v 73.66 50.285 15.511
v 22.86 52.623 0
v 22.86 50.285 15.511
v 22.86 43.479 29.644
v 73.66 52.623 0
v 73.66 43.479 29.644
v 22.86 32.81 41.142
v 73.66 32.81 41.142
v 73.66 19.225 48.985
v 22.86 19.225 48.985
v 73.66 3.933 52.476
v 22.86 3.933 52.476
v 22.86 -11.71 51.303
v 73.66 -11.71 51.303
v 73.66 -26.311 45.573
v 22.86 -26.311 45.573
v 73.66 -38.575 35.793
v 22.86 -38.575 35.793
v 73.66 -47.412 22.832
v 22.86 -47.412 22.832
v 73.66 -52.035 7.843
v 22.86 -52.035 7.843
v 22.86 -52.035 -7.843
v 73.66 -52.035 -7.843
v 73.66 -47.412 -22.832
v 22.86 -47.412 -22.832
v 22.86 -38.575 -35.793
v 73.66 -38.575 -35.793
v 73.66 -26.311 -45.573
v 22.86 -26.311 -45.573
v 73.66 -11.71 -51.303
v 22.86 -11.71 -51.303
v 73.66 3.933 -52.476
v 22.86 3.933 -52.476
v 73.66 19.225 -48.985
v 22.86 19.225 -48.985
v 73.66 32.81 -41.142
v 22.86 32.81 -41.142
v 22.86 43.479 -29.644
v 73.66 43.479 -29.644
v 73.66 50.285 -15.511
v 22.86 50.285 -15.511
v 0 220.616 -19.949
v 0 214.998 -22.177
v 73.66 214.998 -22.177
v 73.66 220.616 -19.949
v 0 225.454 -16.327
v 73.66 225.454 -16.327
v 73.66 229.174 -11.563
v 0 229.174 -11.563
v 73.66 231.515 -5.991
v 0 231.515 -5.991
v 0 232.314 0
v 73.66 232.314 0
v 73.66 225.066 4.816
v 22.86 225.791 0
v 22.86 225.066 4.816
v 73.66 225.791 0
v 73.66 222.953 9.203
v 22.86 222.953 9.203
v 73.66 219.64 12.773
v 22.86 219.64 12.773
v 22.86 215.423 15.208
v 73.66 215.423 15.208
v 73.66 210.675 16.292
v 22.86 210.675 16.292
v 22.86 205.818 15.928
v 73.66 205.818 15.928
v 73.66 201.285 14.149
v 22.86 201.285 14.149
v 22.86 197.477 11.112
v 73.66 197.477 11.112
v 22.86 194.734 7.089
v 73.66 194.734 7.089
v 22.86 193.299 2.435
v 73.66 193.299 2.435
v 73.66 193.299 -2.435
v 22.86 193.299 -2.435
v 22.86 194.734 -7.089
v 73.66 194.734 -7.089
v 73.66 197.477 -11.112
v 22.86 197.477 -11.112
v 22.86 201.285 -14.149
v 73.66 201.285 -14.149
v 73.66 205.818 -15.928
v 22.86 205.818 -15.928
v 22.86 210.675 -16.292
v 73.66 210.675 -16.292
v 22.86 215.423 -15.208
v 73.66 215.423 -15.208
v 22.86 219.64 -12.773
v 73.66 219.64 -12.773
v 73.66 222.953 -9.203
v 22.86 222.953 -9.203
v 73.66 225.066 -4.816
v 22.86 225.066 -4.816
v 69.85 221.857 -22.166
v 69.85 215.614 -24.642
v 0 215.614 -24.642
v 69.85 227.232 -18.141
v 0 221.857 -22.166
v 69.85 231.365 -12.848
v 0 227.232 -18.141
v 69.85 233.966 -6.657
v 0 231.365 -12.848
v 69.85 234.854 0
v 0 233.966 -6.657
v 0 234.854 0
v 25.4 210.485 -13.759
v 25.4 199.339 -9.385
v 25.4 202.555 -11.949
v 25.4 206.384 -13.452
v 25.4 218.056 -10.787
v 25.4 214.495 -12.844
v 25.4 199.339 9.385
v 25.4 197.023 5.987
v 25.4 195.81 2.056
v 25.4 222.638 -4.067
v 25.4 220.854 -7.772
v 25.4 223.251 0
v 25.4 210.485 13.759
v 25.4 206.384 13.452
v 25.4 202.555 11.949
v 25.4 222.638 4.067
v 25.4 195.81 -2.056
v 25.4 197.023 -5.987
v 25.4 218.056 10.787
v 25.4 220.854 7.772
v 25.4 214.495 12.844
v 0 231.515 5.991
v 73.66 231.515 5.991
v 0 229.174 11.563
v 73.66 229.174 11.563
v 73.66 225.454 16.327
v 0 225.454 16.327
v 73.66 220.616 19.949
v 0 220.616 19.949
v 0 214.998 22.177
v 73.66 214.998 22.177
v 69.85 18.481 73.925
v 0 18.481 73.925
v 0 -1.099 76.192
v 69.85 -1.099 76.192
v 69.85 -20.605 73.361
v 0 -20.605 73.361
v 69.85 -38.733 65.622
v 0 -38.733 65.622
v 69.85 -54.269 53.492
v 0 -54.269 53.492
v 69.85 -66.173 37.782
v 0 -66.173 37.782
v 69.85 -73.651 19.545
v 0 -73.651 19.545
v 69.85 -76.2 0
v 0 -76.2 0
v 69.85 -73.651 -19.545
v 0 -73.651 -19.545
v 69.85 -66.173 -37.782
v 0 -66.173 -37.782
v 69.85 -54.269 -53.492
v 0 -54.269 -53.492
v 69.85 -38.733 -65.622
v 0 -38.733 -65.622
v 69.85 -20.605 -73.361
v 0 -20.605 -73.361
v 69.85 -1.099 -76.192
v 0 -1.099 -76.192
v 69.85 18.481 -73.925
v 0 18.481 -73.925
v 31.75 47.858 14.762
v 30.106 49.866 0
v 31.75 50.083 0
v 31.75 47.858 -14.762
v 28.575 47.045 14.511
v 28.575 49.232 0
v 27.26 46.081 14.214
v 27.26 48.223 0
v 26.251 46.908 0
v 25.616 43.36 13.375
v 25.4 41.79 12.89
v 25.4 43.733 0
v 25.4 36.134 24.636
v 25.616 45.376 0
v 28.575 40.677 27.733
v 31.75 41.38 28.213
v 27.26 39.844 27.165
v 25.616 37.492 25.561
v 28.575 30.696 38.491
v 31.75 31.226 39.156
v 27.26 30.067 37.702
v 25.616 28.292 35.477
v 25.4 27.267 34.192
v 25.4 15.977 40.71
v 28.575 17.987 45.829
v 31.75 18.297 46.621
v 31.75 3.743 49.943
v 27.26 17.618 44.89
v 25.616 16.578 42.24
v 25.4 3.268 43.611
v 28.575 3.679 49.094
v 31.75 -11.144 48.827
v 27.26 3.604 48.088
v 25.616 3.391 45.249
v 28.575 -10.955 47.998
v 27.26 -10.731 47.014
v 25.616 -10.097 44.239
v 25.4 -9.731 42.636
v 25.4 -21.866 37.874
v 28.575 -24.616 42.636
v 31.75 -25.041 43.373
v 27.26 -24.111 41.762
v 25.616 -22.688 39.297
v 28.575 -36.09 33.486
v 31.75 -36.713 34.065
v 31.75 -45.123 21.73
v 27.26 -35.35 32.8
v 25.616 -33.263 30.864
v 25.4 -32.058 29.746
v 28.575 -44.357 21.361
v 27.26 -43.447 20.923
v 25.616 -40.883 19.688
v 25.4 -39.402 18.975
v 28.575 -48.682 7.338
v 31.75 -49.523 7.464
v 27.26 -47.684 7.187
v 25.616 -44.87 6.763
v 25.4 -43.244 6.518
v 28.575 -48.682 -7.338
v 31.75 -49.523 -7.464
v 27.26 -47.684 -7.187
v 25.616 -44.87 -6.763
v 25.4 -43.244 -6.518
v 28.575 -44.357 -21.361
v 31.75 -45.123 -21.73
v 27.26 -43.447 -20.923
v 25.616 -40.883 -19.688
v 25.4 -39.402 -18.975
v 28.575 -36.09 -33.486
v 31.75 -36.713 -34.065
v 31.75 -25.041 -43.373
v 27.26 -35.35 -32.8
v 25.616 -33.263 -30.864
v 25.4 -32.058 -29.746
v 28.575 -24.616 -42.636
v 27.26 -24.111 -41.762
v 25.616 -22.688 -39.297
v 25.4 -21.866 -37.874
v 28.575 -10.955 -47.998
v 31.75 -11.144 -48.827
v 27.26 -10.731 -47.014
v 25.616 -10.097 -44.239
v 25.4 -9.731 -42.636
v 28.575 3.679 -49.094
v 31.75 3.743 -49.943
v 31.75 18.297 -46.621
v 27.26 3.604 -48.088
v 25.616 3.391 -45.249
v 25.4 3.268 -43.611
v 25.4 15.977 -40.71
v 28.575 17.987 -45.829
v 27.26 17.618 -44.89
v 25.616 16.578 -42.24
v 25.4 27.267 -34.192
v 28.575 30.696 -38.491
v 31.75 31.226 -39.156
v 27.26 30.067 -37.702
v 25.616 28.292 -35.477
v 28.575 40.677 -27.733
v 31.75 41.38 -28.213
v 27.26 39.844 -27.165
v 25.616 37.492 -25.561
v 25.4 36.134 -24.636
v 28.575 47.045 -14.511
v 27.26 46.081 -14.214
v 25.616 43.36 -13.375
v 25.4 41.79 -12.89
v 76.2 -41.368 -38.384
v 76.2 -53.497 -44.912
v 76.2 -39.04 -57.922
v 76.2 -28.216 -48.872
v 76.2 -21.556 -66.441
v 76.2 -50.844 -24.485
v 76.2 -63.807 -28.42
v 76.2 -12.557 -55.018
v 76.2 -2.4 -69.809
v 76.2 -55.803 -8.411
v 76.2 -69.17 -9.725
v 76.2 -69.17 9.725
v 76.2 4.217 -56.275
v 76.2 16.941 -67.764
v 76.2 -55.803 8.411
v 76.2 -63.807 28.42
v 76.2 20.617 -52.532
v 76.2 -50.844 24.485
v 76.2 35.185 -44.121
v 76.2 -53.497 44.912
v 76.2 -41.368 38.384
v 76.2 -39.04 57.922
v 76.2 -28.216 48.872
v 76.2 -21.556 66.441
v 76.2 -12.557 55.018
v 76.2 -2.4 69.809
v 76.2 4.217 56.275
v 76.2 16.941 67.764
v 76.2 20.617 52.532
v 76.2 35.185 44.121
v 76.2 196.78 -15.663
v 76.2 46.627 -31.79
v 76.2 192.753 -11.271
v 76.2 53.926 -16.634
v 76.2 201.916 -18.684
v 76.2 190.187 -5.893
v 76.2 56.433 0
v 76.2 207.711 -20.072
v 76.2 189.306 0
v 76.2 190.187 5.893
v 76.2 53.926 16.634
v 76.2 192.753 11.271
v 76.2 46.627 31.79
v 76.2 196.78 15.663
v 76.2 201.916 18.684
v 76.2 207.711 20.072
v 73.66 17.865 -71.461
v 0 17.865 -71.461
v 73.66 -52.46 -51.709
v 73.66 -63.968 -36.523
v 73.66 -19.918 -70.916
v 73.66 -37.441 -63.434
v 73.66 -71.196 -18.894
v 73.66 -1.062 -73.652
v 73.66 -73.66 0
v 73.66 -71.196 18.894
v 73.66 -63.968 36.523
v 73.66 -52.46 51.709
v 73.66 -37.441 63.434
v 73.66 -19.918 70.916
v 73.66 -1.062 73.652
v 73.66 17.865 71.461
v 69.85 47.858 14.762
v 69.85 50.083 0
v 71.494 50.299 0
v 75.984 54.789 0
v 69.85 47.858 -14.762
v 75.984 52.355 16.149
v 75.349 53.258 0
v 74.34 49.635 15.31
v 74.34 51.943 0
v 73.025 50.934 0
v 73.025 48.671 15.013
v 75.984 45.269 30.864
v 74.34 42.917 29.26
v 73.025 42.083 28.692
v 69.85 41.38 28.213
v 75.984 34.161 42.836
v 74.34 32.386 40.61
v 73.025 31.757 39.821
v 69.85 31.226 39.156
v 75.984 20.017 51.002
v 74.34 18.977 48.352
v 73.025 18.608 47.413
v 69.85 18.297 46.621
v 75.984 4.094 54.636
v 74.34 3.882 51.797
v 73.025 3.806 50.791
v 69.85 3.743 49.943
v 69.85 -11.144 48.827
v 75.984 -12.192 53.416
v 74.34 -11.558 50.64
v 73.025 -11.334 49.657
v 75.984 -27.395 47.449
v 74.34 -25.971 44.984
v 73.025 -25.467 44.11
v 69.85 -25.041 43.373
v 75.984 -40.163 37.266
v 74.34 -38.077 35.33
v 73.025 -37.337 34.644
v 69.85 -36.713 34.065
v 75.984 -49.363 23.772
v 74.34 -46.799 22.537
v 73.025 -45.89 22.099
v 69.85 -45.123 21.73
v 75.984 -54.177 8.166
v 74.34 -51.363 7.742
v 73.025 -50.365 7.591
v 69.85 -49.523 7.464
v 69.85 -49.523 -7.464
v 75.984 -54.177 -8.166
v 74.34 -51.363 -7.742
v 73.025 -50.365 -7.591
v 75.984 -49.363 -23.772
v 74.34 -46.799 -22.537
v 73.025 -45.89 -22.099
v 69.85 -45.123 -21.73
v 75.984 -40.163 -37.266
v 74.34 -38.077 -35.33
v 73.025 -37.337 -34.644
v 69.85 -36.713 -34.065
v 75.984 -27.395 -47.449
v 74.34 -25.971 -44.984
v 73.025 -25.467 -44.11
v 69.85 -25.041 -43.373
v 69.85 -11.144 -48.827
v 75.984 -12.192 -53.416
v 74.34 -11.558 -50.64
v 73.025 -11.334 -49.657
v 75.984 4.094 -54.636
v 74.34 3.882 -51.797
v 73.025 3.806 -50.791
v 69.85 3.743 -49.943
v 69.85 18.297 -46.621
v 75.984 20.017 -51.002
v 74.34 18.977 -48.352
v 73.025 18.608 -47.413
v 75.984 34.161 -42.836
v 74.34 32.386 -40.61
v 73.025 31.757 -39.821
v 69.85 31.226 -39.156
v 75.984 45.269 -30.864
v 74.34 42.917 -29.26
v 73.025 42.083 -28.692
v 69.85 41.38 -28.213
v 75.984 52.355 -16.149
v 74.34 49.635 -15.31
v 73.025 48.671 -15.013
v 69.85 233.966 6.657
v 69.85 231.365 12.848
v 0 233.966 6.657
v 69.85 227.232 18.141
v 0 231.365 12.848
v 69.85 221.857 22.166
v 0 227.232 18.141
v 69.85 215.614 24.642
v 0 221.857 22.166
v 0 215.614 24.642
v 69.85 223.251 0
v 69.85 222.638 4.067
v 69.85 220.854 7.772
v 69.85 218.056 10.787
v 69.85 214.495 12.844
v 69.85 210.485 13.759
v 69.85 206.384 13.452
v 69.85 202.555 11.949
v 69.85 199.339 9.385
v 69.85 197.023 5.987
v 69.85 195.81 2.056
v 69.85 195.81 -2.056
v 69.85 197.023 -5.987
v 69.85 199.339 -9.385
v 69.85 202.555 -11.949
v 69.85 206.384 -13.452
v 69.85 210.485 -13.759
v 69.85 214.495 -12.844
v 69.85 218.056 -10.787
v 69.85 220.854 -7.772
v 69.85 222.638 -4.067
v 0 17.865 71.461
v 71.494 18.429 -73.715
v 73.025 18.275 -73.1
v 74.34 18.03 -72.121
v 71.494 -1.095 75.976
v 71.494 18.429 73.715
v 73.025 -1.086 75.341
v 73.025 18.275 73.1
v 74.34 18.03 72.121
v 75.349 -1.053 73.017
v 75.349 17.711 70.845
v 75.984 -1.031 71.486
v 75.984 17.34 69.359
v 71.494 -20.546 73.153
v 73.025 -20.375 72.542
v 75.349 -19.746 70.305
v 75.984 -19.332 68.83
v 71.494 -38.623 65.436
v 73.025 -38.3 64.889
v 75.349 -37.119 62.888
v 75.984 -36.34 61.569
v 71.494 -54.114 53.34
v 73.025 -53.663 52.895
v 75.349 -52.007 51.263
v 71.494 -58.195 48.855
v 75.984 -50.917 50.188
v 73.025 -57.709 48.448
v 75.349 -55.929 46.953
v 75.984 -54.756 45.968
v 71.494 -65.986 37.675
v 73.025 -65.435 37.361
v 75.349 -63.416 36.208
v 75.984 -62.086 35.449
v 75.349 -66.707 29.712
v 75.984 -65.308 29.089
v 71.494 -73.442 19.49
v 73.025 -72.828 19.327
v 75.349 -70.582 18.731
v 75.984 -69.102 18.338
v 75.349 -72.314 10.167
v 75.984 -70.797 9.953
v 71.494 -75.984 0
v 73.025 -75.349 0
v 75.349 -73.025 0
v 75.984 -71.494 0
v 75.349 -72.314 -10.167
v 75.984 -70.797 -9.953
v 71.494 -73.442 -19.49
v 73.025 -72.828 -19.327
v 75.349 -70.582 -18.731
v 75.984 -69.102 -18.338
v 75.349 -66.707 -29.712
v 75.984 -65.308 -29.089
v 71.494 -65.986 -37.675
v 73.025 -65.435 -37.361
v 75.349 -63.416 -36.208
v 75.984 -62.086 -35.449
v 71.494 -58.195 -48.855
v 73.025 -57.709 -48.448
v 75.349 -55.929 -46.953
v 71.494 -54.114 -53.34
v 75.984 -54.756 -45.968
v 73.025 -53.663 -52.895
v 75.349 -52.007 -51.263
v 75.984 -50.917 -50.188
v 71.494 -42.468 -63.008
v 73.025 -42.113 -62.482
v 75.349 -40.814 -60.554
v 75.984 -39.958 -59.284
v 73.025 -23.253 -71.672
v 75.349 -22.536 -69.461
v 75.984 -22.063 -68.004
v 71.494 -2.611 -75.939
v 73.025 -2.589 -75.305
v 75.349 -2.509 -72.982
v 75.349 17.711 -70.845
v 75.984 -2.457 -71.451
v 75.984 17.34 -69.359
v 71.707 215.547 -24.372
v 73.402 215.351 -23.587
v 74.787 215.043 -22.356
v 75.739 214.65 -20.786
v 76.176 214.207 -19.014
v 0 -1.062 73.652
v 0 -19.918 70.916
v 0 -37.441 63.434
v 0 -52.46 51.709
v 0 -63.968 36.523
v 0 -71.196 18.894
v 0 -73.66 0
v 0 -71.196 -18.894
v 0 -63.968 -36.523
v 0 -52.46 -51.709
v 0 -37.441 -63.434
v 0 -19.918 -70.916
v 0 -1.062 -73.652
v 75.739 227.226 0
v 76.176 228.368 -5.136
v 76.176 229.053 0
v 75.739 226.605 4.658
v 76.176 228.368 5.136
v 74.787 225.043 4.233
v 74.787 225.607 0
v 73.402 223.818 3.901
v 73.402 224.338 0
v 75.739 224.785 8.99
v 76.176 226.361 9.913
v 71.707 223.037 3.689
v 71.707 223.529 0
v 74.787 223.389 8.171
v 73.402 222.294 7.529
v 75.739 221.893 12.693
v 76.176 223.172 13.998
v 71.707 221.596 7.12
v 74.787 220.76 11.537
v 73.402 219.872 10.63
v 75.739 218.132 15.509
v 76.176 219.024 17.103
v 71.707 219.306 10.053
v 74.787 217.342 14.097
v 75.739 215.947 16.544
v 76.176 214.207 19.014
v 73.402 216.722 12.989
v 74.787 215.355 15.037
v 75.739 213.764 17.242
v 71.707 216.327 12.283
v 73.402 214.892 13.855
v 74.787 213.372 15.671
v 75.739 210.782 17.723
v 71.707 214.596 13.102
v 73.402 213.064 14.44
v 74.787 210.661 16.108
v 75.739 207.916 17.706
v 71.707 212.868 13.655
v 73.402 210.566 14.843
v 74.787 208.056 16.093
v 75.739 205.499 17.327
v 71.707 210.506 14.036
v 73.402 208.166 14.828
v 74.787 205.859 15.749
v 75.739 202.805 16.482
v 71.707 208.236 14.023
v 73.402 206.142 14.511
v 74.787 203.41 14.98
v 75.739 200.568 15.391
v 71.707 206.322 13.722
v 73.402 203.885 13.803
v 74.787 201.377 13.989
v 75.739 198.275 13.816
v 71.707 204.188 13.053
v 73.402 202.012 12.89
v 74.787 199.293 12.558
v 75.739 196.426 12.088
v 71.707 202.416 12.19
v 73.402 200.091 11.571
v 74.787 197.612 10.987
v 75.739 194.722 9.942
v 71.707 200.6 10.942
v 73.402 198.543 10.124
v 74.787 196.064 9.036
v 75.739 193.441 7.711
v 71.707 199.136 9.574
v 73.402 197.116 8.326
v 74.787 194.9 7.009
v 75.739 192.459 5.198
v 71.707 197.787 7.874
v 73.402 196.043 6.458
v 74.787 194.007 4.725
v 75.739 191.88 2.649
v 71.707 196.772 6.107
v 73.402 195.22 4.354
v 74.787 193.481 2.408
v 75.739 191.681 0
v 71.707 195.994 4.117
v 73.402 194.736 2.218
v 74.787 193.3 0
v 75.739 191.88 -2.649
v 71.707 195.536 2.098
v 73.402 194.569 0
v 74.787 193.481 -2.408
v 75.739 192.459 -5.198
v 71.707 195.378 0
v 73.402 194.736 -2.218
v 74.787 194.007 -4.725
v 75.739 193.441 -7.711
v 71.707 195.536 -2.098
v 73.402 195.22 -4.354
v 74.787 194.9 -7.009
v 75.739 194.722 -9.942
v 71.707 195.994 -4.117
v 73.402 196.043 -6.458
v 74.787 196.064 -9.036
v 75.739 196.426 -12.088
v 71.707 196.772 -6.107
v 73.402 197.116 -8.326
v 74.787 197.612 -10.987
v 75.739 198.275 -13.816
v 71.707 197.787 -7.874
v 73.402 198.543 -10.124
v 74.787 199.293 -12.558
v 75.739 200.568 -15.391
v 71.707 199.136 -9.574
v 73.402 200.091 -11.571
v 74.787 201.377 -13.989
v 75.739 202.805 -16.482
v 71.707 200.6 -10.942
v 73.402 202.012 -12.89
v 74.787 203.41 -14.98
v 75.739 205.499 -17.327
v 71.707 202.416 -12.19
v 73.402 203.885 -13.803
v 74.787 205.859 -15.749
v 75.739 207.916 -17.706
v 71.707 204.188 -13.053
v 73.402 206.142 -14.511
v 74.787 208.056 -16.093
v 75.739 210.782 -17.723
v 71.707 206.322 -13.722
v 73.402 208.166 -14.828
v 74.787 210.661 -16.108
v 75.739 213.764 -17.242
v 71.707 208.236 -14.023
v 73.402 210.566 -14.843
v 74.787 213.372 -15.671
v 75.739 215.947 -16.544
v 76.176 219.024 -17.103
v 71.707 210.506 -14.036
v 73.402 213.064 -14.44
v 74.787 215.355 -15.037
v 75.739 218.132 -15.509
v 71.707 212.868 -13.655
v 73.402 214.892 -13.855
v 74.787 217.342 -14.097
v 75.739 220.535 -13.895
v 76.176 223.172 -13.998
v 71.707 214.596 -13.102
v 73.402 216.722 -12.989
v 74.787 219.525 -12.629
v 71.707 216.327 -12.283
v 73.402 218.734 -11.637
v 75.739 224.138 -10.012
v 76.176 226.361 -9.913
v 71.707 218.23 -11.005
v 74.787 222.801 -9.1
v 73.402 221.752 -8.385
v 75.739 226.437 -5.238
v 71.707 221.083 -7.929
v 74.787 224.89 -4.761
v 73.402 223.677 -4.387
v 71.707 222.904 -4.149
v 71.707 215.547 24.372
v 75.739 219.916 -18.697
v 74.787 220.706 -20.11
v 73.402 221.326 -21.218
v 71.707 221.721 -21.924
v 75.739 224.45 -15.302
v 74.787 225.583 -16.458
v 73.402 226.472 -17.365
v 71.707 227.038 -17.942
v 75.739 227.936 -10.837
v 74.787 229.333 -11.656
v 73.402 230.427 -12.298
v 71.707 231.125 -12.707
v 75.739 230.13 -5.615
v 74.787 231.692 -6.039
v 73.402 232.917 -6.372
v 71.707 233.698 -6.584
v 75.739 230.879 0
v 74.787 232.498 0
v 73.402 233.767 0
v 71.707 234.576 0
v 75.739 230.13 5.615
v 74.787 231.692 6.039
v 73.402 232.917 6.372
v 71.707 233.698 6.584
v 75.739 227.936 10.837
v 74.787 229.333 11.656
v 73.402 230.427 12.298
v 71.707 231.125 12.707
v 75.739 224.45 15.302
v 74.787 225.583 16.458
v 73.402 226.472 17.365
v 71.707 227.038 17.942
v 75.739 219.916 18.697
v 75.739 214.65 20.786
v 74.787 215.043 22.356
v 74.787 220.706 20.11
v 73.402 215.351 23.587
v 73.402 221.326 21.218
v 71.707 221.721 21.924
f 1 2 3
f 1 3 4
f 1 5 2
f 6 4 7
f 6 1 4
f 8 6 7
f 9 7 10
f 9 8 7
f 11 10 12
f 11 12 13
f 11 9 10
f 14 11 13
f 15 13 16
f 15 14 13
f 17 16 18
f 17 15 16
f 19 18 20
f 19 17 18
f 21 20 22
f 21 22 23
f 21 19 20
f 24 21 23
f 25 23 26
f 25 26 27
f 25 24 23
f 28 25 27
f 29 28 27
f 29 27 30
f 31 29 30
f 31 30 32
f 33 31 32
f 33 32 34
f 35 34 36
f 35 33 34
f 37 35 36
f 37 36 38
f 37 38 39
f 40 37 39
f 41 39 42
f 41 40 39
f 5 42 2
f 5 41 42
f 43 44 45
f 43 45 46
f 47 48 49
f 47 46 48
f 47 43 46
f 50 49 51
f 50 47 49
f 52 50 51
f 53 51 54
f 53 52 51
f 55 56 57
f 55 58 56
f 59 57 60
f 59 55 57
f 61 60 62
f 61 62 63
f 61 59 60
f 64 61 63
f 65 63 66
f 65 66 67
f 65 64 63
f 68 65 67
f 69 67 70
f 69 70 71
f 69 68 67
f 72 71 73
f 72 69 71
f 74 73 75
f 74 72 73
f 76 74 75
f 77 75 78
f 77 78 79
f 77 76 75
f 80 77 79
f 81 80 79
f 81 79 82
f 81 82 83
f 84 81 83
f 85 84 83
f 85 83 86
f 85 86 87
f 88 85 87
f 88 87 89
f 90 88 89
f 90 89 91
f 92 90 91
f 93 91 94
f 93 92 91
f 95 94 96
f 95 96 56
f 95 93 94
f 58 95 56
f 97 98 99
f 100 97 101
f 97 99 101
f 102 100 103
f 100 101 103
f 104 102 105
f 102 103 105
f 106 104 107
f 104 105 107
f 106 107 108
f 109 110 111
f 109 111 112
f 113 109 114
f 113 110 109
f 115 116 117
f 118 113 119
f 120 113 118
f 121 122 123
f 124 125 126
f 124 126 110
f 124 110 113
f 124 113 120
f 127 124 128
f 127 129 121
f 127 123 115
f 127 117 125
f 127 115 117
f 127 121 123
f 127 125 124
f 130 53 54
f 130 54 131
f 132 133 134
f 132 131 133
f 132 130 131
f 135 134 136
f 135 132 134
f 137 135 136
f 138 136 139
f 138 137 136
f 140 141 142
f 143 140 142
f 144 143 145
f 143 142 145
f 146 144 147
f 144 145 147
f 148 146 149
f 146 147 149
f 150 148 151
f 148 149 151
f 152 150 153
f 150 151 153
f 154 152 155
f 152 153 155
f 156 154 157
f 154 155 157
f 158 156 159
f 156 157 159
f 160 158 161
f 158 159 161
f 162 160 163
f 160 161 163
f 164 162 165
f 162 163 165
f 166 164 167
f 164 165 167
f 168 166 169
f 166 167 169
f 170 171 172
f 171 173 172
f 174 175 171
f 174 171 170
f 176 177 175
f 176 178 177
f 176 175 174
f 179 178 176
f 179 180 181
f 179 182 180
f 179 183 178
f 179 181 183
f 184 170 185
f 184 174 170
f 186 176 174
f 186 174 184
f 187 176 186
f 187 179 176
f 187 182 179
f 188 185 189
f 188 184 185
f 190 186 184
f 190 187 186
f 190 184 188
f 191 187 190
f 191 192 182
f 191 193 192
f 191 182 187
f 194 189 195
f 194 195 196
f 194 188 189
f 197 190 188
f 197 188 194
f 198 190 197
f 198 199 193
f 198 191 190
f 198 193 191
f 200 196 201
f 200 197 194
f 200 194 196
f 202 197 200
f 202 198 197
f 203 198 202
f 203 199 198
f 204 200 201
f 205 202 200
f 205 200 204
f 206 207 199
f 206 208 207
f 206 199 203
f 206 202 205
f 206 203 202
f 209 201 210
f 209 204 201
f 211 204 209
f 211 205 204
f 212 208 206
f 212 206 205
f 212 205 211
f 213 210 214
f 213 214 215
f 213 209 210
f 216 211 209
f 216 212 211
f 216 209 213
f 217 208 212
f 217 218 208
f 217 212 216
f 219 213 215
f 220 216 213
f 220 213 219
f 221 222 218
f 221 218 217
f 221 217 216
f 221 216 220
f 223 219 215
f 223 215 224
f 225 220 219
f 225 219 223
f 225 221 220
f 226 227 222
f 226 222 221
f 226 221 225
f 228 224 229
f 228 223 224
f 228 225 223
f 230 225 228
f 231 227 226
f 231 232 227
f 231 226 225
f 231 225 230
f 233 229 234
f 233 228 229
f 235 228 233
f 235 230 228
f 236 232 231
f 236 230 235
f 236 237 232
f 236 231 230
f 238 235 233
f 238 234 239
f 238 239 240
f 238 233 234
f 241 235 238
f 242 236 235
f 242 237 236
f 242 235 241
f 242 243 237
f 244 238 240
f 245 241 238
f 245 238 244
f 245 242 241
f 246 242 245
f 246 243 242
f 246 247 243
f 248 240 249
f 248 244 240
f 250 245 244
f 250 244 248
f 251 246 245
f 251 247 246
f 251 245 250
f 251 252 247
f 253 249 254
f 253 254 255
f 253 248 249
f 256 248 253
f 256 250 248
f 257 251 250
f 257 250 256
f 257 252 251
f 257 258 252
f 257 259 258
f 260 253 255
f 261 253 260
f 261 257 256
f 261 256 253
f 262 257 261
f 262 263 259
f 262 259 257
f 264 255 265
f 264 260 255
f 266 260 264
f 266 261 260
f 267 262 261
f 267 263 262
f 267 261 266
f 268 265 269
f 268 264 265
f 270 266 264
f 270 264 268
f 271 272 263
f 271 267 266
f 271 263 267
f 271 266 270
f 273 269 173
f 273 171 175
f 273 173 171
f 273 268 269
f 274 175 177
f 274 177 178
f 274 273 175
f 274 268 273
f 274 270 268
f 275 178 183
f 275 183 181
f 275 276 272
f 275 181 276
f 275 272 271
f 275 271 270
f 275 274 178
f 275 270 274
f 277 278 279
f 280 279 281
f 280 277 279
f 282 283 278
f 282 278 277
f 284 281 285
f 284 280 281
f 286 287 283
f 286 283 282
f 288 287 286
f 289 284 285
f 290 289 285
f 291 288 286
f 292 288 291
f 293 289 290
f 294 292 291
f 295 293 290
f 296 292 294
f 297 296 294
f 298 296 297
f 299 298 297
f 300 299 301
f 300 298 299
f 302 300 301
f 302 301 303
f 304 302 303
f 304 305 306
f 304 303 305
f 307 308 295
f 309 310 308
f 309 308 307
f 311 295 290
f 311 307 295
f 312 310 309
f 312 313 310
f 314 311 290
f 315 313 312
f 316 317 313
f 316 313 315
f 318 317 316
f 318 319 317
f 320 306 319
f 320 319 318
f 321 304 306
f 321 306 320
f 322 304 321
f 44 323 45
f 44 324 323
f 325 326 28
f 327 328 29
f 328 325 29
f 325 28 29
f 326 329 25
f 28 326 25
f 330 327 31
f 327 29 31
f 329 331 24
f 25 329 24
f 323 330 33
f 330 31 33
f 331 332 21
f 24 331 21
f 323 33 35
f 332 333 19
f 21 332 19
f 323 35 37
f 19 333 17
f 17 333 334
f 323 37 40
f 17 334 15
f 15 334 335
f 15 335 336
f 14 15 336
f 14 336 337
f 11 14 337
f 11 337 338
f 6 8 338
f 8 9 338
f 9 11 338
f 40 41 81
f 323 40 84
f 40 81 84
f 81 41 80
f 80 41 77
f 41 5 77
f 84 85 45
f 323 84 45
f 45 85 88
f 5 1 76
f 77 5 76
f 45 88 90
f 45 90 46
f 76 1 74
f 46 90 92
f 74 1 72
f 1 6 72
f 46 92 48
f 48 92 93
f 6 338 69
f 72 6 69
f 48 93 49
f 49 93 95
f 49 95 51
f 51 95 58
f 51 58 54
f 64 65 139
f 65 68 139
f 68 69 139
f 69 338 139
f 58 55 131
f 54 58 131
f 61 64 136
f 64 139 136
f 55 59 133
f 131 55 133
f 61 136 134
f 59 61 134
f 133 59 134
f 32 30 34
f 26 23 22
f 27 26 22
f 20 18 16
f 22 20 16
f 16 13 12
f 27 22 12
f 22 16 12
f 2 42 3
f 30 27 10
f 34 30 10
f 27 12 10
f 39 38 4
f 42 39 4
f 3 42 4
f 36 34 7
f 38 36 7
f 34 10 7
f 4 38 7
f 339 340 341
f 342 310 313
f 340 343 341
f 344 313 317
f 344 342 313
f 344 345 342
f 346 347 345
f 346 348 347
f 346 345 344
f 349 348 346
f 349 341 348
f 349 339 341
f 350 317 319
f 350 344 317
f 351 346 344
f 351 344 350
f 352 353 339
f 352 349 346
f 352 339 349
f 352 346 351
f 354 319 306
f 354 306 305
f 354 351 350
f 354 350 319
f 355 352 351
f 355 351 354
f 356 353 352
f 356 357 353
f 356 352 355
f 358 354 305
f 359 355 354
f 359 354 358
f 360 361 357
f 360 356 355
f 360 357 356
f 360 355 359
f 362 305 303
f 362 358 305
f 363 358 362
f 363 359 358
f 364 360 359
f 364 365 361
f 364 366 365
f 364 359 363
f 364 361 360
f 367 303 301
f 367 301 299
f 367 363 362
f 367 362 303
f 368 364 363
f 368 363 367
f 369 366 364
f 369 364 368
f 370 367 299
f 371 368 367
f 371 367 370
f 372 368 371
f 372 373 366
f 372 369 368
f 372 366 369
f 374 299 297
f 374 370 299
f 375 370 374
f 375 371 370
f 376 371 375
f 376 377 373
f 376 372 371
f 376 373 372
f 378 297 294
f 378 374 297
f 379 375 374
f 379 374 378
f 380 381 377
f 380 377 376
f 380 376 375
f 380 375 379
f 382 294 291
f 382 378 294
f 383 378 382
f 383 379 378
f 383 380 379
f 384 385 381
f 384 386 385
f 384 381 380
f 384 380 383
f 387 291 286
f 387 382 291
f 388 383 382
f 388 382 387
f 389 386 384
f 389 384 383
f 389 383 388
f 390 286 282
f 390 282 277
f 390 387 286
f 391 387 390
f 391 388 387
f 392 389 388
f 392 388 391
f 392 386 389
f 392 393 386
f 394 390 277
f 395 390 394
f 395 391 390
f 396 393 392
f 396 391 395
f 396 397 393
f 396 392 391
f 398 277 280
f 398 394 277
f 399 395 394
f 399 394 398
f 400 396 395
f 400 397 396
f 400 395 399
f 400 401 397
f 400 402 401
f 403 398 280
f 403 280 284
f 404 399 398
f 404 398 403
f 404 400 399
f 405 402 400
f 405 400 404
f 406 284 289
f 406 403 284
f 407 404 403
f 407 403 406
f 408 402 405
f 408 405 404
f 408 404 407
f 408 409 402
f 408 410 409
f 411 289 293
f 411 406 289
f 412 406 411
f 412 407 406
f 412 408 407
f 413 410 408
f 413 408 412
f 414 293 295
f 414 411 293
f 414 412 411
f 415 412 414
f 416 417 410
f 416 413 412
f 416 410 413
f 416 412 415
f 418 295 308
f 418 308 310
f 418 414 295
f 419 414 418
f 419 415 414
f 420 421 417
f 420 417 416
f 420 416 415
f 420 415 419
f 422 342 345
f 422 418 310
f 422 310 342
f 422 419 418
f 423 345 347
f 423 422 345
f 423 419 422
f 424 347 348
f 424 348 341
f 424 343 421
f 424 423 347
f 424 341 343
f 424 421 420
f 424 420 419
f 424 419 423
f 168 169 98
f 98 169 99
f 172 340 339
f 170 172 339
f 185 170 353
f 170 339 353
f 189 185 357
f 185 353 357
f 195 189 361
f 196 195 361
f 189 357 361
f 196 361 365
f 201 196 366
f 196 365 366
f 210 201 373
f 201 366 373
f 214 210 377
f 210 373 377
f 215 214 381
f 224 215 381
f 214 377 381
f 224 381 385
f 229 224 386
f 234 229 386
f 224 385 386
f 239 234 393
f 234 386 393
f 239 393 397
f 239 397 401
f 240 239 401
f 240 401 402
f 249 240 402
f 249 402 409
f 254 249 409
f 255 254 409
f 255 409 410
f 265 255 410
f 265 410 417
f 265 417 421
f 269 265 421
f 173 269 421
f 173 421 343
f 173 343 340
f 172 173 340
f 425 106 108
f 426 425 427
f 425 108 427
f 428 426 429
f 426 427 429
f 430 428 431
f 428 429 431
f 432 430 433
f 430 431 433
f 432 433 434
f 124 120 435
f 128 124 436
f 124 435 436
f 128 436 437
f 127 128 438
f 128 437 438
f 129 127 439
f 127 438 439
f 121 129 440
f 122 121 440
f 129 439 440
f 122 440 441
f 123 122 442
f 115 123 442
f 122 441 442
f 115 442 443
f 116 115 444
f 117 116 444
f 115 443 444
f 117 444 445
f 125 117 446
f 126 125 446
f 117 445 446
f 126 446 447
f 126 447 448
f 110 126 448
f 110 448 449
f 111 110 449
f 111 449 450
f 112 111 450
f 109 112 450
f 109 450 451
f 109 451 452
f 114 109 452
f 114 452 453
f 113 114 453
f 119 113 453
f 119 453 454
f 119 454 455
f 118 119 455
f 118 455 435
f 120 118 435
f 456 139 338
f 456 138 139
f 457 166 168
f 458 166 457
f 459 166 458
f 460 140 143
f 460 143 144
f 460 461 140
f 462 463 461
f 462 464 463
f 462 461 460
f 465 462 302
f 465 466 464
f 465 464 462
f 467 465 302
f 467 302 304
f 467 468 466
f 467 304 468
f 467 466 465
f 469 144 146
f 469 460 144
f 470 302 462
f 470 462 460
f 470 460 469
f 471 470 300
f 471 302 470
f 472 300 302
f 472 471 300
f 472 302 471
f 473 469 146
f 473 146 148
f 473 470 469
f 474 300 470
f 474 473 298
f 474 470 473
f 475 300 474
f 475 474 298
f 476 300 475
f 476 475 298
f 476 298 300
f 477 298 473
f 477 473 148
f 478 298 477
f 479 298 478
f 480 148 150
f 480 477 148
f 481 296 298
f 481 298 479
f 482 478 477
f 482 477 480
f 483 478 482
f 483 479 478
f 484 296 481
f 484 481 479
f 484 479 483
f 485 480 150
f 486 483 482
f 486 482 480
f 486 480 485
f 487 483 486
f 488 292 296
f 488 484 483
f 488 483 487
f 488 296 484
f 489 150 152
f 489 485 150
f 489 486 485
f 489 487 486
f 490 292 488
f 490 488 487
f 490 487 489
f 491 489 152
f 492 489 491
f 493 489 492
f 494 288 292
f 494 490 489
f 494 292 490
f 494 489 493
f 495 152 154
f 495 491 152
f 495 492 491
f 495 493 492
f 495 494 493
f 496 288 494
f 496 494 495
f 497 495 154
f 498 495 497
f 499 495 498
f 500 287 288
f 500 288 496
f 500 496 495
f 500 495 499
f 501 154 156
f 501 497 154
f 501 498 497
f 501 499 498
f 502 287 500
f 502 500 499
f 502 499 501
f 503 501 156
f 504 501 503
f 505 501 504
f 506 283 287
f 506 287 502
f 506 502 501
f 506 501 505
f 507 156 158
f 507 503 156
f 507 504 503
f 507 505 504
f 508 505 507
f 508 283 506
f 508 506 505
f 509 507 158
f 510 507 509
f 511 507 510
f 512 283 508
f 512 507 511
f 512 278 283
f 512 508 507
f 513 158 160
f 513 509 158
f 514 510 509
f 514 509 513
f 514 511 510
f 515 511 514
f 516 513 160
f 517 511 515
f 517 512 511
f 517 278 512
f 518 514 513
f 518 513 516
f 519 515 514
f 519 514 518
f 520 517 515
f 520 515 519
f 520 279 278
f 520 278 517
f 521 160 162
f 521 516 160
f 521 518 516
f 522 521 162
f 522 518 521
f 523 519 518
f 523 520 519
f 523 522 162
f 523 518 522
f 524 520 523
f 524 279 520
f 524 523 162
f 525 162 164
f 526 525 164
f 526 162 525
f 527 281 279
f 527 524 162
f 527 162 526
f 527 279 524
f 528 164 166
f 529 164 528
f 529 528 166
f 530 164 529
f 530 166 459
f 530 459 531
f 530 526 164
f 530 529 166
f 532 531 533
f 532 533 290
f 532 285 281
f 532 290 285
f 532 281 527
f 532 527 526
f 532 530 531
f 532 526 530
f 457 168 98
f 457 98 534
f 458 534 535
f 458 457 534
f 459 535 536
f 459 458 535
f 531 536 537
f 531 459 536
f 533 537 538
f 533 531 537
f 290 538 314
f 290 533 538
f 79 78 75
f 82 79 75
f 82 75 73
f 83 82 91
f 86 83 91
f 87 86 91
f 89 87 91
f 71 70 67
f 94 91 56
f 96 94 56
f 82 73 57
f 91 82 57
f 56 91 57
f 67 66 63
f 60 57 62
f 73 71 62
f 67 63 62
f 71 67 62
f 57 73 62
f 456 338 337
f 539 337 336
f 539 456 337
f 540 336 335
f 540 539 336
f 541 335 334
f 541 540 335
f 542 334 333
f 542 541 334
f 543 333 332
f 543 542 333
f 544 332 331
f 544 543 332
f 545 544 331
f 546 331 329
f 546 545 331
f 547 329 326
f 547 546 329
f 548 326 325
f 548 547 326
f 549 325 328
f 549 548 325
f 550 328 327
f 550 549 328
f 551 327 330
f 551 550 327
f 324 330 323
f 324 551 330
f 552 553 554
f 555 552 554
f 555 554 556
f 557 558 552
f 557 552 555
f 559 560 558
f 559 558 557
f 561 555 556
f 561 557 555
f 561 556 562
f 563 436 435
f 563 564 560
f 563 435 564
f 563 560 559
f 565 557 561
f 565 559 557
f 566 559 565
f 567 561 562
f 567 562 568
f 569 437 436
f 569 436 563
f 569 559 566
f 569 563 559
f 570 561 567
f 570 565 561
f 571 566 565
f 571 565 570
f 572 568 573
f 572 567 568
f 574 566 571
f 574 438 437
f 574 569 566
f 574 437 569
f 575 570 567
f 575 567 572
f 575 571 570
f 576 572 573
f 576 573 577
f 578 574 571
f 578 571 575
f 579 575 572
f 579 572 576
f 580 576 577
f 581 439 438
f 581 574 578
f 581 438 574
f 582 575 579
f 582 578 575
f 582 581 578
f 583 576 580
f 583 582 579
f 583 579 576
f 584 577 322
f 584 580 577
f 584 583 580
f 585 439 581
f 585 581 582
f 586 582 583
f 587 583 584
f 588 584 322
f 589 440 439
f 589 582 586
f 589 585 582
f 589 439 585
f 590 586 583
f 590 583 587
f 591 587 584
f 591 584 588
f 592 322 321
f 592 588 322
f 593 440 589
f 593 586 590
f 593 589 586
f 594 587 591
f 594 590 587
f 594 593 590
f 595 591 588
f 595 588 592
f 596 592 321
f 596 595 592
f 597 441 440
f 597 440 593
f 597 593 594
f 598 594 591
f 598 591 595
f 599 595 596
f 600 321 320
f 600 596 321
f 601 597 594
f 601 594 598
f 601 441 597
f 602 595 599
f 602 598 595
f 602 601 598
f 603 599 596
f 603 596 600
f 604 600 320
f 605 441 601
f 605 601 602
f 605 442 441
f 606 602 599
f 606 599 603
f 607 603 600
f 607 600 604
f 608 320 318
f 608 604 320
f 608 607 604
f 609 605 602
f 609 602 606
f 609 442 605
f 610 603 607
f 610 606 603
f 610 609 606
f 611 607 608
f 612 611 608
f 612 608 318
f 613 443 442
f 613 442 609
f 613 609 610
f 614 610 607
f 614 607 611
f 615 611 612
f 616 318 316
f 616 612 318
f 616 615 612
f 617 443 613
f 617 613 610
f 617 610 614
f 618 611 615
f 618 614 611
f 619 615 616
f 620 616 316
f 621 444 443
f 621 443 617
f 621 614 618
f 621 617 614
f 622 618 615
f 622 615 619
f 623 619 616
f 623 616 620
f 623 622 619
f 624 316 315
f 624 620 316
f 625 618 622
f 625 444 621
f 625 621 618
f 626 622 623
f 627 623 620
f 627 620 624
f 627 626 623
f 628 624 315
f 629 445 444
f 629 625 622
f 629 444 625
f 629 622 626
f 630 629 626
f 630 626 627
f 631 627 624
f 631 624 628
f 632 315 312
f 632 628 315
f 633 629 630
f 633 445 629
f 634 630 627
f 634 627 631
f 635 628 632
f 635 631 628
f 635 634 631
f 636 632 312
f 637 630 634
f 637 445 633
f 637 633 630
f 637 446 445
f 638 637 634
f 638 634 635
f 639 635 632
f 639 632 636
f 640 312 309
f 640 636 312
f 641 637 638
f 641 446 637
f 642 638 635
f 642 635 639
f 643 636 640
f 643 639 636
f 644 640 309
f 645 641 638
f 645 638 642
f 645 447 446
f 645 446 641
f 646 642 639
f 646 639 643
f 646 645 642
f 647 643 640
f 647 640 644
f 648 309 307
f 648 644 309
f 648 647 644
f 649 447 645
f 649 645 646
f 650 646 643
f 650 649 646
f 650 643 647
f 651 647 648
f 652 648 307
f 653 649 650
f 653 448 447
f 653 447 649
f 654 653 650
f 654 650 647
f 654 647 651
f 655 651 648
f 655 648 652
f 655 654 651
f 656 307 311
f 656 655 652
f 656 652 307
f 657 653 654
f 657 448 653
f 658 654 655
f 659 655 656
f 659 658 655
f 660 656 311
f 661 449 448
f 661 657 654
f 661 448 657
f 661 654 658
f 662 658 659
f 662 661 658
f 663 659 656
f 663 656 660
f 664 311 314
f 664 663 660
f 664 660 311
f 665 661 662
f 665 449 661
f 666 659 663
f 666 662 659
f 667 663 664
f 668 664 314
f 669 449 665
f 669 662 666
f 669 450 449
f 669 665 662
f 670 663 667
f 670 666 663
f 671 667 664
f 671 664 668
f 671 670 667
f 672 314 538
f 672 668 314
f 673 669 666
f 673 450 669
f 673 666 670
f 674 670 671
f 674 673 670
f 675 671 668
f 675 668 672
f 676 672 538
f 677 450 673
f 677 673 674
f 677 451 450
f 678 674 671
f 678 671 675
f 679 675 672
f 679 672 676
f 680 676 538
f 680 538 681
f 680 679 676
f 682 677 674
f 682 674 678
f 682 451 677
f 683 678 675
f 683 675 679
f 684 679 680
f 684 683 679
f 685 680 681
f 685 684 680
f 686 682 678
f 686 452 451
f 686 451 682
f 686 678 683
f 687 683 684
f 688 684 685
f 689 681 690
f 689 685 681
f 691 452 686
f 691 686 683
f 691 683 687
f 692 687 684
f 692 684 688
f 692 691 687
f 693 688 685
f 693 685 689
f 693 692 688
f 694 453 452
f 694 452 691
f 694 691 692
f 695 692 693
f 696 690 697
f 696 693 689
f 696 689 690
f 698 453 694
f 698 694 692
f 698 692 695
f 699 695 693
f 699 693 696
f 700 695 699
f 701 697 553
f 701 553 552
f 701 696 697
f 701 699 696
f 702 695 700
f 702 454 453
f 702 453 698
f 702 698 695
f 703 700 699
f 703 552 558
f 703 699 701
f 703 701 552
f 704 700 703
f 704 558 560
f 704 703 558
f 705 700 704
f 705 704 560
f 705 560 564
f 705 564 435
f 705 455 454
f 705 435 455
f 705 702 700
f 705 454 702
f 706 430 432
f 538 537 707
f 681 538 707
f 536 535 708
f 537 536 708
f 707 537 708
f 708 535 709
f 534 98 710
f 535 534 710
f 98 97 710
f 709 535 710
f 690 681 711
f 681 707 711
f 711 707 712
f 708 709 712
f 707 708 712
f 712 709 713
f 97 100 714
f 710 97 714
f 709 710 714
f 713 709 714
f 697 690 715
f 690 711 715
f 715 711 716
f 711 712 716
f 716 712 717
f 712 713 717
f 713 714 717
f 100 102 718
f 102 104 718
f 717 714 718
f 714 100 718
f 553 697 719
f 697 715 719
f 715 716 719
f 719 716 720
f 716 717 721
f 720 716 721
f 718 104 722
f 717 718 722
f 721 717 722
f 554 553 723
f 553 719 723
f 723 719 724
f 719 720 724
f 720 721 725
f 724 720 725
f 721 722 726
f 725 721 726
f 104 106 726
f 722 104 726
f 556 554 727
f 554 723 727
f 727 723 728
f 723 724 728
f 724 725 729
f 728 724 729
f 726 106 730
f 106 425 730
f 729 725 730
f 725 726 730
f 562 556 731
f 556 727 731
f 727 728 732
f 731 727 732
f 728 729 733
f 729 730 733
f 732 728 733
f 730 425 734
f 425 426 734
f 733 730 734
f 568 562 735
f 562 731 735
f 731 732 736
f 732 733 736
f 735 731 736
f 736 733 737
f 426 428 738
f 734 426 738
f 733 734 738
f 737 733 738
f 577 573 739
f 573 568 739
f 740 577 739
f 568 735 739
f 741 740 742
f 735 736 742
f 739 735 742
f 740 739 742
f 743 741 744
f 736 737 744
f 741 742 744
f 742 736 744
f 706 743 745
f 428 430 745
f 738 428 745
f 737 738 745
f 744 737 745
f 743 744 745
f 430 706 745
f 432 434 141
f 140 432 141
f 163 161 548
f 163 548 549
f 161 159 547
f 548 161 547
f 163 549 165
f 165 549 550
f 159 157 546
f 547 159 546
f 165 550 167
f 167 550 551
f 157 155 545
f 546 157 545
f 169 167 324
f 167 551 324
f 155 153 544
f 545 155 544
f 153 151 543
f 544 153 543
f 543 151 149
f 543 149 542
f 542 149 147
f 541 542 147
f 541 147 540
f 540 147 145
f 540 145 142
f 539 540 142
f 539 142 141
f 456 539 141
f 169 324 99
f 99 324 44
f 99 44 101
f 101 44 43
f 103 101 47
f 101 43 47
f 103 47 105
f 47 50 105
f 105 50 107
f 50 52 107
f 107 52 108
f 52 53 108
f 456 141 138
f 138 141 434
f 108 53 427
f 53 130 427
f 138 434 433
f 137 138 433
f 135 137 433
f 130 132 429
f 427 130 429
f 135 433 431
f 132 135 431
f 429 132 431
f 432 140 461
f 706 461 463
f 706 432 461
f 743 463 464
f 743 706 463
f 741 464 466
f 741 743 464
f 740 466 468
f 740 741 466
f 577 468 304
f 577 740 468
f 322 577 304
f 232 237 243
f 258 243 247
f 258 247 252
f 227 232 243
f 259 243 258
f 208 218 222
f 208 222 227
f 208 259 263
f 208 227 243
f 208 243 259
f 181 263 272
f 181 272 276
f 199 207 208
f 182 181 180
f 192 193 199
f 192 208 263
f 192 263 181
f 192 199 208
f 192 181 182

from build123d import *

# Parameters (mm, degrees)
F1_DEPTH     = 76.2
F2_R         = 50.0828504331
F2_R_2       = 13.7976444657
F3_DEPTH     = 50.8
F4_T         = -2.54
F5_T3_DEPTH  = 203.2
F5_T5_DEPTH  = 203.2
F5_T8_ANGLE  = 208.0724869359
F5_T10_ANGLE = 151.9275130641


# Not quite as in the source:
# - a fillet or chamfer that OpenCascade refuses, or shapes differently, is made with other operations: its cross-section is extruded or revolved along the edge and cut away or added


with BuildPart() as f1:
    # F0 (on Right) → F1 (new body)
    with BuildSketch(Plane.YZ):
        with BuildLine():
            ThreePointArc((18.4812146278, -73.9248585111), (60.0612543768, -46.8944103565), (76.2, 0))
            ThreePointArc((76.2, 0), (60.0612543768, 46.8944103565), (18.4812146278, 73.9248585111))
            ThreePointArc((18.4812146278, 73.9248585111), (-76.2, 0), (18.4812146278, -73.9248585111))
        make_face()
        with BuildLine():
            ThreePointArc((18.4812146278, 73.9248585111), (60.0612543768, 46.8944103565), (76.2, 0))
            ThreePointArc((76.2, 0), (60.0612543768, -46.8944103565), (18.4812146278, -73.9248585111))
            Line((18.4812146278, -73.9248585111), (215.6141706573, -24.6416195037))
            ThreePointArc((215.6141706573, -24.6416195037), (184.0537657814, 0), (215.6141706573, 24.6416195037))
            Line((215.6141706573, 24.6416195037), (18.4812146278, 73.9248585111))
        make_face()
        with BuildLine():
            ThreePointArc((234.8537657814, 0), (229.474183907, 15.6314701188), (215.6141706573, 24.6416195037))
            ThreePointArc((215.6141706573, 24.6416195037), (184.0537657814, 0), (215.6141706573, -24.6416195037))
            ThreePointArc((215.6141706573, -24.6416195037), (229.474183907, -15.6314701188), (234.8537657814, 0))
        make_face()
    extrude(amount=F1_DEPTH)

    # F2 (on face) → F3 (cut)
    with BuildSketch(Plane.YZ.offset(76.2)):
        Circle(F2_R)
        with Locations((209.4537657814, 0)):
            Circle(F2_R_2)
    extrude(amount=-F3_DEPTH, mode=Mode.SUBTRACT)

    # F4
    f4_openings = [f1.faces().sort_by_distance(p)[0] for p in [
        (0, 57.51924, 0),
    ]]
    offset(amount=F4_T, openings=f4_openings, kind=Kind.INTERSECTION)

    # F5: fillet of radius 6.35 on 7 edges, made by hand

    # F5_s1 → F5_t2 (revolve)
    with BuildSketch(Plane.XY):
        with BuildLine():
            ThreePointArc((31.75, 50.0828504331), (27.2598719395, 48.2229784936), (25.4, 43.7328504331))
            Line((25.4, 43.7328504331), (25.4, 50.0828504331))
            Line((25.4, 50.0828504331), (31.75, 50.0828504331))
        make_face()
    revolve(axis=Axis((25.4, 0, 0), (1, 0, 0)))

    # F5_s4 → F5_t3 (cut)
    with BuildSketch(Plane(origin=(0, 197.1329560295, -49.2832390074), x_dir=(1, 0, 0), z_dir=(0, -0.9701425001, 0.242535625))):
        with BuildLine():
            ThreePointArc((69.85, 76.2), (74.3401280605, 74.3401280605), (76.2, 69.85))
            Line((76.2, 69.85), (76.2, 76.2))
            Line((76.2, 76.2), (69.85, 76.2))
        make_face()
    extrude(amount=F5_T3_DEPTH, mode=Mode.SUBTRACT)

    # F5_s6 → F5_t5 (cut)
    with BuildSketch(Plane(origin=(0, 0, 0), x_dir=(1, 0, 0), z_dir=(0, 0.9701425001, 0.242535625))):
        with BuildLine():
            ThreePointArc((69.85, 76.2), (74.3401280605, 74.3401280605), (76.2, 69.85))
            Line((76.2, 69.85), (76.2, 76.2))
            Line((76.2, 76.2), (69.85, 76.2))
        make_face()
    extrude(amount=F5_T5_DEPTH, mode=Mode.SUBTRACT)

    # F5_s7 → F5_t8 (revolve, cut)
    with BuildSketch(Plane(origin=(0, 0, 0), x_dir=(1, 0, 0), z_dir=(0, 0.9701425001, -0.242535625))):
        with BuildLine():
            ThreePointArc((69.85, -76.2), (74.3401280605, -74.3401280605), (76.2, -69.85))
            Line((76.2, -69.85), (76.2, -76.2))
            Line((76.2, -76.2), (69.85, -76.2))
        make_face()
    revolve(axis=Axis((76.2, 0, 0), (1, 0, 0)), revolution_arc=F5_T8_ANGLE, mode=Mode.SUBTRACT)

    # F5_s9 → F5_t10 (revolve, cut)
    with BuildSketch(Plane(origin=(0, 197.1329560295, 49.2832390074), x_dir=(1, 0, 0), z_dir=(0, -0.9701425001, -0.242535625))):
        with BuildLine():
            ThreePointArc((76.2, -69.85), (74.3401280605, -74.3401280605), (69.85, -76.2))
            Line((69.85, -76.2), (76.2, -76.2))
            Line((76.2, -76.2), (76.2, -69.85))
        make_face()
    revolve(axis=Axis((76.2, 209.4537657814, 0), (1, 0, 0)), revolution_arc=F5_T10_ANGLE, mode=Mode.SUBTRACT)

    # F5_s11 → F5_t12 (revolve, cut)
    with BuildSketch(Plane.XY):
        with BuildLine():
            ThreePointArc((76.2, 56.4328504331), (74.3401280605, 51.9427223726), (69.85, 50.0828504331))
            Line((69.85, 50.0828504331), (76.2, 50.0828504331))
            Line((76.2, 50.0828504331), (76.2, 56.4328504331))
        make_face()
    revolve(axis=Axis((76.2, 0, 0), (1, 0, 0)), mode=Mode.SUBTRACT)

    # F5_s13 → F5_t14 (revolve, cut)
    with BuildSketch(Plane.XY):
        with BuildLine():
            ThreePointArc((76.2, 229.6014102471), (74.3401280605, 225.1112821866), (69.85, 223.2514102471))
            Line((69.85, 223.2514102471), (76.2, 223.2514102471))
            Line((76.2, 223.2514102471), (76.2, 229.6014102471))
        make_face()
    revolve(axis=Axis((76.2, 209.4537657814, 0), (1, 0, 0)), mode=Mode.SUBTRACT)


solid = f1.part
